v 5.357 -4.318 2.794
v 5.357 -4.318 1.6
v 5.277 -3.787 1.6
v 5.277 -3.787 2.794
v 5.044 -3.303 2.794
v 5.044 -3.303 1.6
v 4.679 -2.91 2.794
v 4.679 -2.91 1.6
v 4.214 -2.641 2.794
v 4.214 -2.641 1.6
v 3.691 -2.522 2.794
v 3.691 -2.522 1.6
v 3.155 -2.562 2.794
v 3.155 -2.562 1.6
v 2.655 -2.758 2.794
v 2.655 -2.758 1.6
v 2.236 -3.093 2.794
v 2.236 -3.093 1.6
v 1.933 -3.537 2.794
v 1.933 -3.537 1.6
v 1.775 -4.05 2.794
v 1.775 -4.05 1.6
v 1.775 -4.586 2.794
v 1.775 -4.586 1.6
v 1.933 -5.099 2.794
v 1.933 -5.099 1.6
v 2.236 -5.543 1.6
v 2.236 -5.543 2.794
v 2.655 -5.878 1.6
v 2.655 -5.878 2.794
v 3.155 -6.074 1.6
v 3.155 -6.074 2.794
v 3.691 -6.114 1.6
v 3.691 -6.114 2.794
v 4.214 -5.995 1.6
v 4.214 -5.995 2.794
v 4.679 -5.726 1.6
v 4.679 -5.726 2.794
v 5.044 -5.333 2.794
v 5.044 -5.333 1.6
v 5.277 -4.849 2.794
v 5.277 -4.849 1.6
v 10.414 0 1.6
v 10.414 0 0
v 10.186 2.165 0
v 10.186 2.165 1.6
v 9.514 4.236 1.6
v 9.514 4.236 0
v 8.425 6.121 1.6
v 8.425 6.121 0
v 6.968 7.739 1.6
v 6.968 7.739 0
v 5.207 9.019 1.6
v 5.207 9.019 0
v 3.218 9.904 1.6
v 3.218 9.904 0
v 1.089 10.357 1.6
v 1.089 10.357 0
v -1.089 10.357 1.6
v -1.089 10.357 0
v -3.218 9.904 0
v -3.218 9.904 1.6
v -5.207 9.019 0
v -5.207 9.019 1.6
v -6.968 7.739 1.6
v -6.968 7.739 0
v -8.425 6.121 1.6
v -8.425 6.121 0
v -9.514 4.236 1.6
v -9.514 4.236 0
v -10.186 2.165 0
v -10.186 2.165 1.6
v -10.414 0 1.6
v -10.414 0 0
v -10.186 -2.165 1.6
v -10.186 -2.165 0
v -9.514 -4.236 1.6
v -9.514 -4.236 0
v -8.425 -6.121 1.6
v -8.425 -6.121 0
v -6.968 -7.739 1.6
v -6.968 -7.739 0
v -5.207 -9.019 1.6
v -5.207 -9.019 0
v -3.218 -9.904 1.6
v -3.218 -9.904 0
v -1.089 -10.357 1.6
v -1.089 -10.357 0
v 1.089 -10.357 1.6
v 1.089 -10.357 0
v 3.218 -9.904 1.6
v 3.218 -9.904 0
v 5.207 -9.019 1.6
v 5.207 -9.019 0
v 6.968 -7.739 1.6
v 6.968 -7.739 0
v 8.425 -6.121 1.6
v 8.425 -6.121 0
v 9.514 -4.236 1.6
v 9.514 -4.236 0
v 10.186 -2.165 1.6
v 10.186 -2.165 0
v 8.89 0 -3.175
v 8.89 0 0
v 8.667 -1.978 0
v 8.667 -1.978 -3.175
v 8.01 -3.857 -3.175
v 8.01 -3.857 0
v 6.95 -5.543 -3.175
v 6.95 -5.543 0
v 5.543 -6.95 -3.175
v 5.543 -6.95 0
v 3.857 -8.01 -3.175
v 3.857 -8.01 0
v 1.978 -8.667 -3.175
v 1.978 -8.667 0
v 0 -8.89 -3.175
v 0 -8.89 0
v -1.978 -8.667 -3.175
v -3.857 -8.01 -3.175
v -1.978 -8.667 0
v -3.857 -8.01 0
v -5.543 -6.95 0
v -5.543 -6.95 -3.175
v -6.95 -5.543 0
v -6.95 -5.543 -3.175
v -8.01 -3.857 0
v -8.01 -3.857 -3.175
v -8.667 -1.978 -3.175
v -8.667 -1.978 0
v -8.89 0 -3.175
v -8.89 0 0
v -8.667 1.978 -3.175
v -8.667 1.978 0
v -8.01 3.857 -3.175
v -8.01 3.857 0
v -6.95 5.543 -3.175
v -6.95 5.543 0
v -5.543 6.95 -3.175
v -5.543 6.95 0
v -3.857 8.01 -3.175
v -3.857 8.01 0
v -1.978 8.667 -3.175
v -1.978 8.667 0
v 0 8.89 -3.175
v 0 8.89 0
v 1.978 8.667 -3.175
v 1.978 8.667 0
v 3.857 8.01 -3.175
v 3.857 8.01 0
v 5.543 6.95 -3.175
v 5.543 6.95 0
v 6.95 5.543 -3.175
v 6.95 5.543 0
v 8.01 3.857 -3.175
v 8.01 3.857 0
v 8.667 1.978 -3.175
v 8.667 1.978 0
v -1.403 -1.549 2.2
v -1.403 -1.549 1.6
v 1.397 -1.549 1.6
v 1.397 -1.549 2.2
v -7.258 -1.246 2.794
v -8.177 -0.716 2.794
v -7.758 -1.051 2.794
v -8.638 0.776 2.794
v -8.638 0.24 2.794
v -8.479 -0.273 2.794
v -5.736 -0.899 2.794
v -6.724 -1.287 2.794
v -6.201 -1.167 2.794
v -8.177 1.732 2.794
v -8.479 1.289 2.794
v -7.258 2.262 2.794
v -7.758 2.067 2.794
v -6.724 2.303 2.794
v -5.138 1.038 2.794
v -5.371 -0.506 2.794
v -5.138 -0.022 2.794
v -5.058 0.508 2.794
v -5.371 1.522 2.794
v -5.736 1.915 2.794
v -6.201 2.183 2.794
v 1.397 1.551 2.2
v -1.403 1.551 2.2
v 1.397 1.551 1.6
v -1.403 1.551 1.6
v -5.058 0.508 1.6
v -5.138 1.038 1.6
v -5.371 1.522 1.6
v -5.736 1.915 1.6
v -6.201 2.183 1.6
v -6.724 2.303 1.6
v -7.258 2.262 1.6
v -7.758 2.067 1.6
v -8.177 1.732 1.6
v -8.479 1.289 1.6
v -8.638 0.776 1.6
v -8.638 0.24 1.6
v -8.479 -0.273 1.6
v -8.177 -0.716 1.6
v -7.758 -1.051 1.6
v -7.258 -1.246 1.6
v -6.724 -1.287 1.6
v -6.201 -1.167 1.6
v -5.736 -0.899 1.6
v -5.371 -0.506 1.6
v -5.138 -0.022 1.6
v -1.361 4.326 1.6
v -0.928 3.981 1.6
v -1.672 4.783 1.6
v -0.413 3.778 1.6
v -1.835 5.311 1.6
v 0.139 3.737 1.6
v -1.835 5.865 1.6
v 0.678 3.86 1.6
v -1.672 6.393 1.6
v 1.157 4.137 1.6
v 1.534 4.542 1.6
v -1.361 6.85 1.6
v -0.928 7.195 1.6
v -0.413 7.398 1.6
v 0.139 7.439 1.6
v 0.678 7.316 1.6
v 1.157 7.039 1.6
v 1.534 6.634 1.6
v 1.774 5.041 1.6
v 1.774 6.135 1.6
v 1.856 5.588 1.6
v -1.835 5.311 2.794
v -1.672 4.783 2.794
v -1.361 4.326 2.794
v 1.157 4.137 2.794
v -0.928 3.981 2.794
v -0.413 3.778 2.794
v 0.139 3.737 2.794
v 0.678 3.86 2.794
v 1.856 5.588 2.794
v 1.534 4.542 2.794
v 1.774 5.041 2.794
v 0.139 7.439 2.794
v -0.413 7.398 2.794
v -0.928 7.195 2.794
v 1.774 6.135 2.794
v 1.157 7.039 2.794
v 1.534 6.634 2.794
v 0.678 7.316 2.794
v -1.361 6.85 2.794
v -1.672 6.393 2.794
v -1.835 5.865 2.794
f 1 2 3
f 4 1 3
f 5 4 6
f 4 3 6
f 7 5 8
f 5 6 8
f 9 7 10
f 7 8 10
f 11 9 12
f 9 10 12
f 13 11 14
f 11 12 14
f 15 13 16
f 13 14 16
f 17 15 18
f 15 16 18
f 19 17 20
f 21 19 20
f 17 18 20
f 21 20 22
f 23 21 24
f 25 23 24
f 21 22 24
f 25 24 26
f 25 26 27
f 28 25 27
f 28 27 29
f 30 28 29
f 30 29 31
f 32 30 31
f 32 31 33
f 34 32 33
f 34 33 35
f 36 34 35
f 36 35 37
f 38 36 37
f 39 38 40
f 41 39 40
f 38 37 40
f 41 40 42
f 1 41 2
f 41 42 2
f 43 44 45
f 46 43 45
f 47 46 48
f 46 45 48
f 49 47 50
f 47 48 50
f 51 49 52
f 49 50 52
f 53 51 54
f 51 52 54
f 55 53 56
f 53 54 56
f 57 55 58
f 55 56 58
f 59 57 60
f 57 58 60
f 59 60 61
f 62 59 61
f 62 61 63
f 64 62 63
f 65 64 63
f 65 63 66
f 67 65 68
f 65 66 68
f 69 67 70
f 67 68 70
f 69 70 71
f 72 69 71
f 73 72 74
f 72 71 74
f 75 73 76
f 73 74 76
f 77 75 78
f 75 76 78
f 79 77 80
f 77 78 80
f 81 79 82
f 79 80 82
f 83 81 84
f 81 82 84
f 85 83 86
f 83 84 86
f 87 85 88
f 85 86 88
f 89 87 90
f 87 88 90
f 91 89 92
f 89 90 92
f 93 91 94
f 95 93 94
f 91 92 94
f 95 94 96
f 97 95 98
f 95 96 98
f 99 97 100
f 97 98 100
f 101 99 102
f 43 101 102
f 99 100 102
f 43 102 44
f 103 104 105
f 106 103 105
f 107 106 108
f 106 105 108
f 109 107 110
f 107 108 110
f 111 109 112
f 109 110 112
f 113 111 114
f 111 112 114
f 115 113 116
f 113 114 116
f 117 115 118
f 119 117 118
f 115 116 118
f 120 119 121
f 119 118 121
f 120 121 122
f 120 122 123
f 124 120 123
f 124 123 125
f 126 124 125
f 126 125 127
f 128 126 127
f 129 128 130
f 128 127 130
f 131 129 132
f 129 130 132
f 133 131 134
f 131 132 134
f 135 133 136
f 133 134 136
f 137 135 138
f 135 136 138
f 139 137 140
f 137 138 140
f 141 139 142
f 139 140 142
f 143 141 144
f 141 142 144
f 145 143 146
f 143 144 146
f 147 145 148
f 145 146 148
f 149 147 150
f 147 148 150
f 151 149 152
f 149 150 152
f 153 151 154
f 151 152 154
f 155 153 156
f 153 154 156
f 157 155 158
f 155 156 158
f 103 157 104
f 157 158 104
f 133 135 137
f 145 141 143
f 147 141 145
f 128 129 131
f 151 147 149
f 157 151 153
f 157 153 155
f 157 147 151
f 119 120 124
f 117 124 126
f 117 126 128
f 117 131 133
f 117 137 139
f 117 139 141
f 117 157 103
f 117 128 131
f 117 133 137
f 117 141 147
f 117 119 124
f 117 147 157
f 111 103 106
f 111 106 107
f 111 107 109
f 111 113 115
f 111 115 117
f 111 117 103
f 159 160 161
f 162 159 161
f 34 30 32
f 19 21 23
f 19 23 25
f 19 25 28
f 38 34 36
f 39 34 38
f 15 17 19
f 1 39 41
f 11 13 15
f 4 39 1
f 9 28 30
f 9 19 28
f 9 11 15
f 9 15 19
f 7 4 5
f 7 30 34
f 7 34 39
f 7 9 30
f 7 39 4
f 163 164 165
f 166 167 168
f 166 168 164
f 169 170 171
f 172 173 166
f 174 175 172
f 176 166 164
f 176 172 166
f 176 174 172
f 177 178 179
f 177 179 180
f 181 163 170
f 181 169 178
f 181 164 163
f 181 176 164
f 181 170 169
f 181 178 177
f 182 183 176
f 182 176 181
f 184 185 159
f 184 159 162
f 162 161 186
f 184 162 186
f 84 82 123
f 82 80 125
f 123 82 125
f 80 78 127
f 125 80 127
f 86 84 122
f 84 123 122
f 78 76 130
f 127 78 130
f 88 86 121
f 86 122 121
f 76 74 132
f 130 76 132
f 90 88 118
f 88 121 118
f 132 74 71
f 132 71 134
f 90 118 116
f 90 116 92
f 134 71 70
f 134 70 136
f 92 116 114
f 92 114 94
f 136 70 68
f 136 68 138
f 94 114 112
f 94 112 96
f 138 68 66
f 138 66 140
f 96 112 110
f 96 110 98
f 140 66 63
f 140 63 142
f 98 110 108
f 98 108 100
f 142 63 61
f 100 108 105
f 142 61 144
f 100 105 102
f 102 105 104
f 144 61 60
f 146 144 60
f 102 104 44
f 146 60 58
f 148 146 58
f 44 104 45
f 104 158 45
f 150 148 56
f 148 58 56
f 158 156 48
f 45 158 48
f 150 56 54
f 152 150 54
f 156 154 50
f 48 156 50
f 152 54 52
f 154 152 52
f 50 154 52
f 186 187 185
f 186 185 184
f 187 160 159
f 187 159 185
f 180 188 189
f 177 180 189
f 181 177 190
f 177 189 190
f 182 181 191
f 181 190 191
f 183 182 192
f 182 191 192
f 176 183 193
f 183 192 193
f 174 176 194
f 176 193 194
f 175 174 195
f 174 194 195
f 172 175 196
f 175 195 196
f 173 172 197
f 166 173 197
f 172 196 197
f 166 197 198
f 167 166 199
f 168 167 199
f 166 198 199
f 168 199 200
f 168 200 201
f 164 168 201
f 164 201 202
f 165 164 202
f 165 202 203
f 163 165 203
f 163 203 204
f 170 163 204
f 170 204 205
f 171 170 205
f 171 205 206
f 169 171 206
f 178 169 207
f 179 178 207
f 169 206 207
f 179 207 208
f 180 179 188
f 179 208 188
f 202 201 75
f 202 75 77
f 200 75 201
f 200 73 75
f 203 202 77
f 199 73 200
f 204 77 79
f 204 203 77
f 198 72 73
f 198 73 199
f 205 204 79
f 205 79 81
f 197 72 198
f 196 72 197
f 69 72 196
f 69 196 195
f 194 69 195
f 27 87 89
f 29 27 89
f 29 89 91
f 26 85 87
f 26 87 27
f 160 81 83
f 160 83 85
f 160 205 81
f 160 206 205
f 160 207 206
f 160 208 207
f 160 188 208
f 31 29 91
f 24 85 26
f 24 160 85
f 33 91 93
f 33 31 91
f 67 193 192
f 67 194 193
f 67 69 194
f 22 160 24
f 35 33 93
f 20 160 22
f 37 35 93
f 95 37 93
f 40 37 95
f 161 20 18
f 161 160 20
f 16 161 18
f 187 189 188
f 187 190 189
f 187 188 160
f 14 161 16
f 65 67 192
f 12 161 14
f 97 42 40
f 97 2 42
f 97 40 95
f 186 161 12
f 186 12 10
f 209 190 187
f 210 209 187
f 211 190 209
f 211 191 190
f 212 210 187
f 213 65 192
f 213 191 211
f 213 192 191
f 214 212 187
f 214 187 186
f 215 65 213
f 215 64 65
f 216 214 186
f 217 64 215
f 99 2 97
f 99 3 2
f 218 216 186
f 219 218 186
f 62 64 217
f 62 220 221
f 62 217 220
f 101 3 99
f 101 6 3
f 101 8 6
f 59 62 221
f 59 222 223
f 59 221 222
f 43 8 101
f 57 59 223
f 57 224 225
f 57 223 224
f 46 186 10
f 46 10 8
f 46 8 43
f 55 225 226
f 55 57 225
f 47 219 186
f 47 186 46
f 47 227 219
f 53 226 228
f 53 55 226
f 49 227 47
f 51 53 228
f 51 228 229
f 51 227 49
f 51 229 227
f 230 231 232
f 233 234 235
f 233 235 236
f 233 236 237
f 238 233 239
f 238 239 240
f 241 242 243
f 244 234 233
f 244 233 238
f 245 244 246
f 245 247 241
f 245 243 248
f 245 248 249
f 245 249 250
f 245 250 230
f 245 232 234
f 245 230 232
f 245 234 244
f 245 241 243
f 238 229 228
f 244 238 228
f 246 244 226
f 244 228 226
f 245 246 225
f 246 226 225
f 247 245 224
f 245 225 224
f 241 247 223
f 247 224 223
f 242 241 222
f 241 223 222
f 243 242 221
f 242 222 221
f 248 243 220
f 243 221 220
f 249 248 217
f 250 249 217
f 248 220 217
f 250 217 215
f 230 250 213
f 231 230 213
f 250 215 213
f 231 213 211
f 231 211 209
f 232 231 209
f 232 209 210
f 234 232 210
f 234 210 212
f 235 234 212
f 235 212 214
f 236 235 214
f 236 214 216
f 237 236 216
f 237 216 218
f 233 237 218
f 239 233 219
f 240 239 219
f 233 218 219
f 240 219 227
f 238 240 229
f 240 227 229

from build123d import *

# Parameters (mm, degrees)
F0_R     = 10.414
F1_DEPTH = 1.6
F2_R     = 8.89
F3_DEPTH = 3.175
F4_R     = 1.856091
F4_R_2   = 1.80108
F4_R_3   = 1.799605
F5_DEPTH = 1.1938
F6_W     = 2.8
F6_H     = 3.1
F7_DEPTH = 0.6


with BuildPart() as f1:
    # F0 (on Top) → F1 (new body)
    with BuildSketch(Plane.XY):
        Circle(F0_R)
    extrude(amount=F1_DEPTH)

    # F2 (on face) → F3 (join)
    with BuildSketch(Plane(origin=(0, 0, 0), x_dir=(1, 0, 0), z_dir=(0, 0, -1))):
        Circle(F2_R)
    extrude(amount=F3_DEPTH)

    # F4 (on face) → F5 (join)
    with BuildSketch(Plane.XY.offset(1.6)):
        with Locations((0, 5.588)):
            Circle(F4_R)
        with Locations((3.556, -4.318)):
            Circle(F4_R_2)
        with Locations((-6.858, 0.508)):
            Circle(F4_R_3)
    extrude(amount=F5_DEPTH)

    # F6 (on face) → F7 (join)
    with BuildSketch(Plane.XY.offset(1.6)):
        with Locations((-0.003, 0.0006)):
            Rectangle(F6_W, F6_H)
    extrude(amount=F7_DEPTH)


solid = f1.part
